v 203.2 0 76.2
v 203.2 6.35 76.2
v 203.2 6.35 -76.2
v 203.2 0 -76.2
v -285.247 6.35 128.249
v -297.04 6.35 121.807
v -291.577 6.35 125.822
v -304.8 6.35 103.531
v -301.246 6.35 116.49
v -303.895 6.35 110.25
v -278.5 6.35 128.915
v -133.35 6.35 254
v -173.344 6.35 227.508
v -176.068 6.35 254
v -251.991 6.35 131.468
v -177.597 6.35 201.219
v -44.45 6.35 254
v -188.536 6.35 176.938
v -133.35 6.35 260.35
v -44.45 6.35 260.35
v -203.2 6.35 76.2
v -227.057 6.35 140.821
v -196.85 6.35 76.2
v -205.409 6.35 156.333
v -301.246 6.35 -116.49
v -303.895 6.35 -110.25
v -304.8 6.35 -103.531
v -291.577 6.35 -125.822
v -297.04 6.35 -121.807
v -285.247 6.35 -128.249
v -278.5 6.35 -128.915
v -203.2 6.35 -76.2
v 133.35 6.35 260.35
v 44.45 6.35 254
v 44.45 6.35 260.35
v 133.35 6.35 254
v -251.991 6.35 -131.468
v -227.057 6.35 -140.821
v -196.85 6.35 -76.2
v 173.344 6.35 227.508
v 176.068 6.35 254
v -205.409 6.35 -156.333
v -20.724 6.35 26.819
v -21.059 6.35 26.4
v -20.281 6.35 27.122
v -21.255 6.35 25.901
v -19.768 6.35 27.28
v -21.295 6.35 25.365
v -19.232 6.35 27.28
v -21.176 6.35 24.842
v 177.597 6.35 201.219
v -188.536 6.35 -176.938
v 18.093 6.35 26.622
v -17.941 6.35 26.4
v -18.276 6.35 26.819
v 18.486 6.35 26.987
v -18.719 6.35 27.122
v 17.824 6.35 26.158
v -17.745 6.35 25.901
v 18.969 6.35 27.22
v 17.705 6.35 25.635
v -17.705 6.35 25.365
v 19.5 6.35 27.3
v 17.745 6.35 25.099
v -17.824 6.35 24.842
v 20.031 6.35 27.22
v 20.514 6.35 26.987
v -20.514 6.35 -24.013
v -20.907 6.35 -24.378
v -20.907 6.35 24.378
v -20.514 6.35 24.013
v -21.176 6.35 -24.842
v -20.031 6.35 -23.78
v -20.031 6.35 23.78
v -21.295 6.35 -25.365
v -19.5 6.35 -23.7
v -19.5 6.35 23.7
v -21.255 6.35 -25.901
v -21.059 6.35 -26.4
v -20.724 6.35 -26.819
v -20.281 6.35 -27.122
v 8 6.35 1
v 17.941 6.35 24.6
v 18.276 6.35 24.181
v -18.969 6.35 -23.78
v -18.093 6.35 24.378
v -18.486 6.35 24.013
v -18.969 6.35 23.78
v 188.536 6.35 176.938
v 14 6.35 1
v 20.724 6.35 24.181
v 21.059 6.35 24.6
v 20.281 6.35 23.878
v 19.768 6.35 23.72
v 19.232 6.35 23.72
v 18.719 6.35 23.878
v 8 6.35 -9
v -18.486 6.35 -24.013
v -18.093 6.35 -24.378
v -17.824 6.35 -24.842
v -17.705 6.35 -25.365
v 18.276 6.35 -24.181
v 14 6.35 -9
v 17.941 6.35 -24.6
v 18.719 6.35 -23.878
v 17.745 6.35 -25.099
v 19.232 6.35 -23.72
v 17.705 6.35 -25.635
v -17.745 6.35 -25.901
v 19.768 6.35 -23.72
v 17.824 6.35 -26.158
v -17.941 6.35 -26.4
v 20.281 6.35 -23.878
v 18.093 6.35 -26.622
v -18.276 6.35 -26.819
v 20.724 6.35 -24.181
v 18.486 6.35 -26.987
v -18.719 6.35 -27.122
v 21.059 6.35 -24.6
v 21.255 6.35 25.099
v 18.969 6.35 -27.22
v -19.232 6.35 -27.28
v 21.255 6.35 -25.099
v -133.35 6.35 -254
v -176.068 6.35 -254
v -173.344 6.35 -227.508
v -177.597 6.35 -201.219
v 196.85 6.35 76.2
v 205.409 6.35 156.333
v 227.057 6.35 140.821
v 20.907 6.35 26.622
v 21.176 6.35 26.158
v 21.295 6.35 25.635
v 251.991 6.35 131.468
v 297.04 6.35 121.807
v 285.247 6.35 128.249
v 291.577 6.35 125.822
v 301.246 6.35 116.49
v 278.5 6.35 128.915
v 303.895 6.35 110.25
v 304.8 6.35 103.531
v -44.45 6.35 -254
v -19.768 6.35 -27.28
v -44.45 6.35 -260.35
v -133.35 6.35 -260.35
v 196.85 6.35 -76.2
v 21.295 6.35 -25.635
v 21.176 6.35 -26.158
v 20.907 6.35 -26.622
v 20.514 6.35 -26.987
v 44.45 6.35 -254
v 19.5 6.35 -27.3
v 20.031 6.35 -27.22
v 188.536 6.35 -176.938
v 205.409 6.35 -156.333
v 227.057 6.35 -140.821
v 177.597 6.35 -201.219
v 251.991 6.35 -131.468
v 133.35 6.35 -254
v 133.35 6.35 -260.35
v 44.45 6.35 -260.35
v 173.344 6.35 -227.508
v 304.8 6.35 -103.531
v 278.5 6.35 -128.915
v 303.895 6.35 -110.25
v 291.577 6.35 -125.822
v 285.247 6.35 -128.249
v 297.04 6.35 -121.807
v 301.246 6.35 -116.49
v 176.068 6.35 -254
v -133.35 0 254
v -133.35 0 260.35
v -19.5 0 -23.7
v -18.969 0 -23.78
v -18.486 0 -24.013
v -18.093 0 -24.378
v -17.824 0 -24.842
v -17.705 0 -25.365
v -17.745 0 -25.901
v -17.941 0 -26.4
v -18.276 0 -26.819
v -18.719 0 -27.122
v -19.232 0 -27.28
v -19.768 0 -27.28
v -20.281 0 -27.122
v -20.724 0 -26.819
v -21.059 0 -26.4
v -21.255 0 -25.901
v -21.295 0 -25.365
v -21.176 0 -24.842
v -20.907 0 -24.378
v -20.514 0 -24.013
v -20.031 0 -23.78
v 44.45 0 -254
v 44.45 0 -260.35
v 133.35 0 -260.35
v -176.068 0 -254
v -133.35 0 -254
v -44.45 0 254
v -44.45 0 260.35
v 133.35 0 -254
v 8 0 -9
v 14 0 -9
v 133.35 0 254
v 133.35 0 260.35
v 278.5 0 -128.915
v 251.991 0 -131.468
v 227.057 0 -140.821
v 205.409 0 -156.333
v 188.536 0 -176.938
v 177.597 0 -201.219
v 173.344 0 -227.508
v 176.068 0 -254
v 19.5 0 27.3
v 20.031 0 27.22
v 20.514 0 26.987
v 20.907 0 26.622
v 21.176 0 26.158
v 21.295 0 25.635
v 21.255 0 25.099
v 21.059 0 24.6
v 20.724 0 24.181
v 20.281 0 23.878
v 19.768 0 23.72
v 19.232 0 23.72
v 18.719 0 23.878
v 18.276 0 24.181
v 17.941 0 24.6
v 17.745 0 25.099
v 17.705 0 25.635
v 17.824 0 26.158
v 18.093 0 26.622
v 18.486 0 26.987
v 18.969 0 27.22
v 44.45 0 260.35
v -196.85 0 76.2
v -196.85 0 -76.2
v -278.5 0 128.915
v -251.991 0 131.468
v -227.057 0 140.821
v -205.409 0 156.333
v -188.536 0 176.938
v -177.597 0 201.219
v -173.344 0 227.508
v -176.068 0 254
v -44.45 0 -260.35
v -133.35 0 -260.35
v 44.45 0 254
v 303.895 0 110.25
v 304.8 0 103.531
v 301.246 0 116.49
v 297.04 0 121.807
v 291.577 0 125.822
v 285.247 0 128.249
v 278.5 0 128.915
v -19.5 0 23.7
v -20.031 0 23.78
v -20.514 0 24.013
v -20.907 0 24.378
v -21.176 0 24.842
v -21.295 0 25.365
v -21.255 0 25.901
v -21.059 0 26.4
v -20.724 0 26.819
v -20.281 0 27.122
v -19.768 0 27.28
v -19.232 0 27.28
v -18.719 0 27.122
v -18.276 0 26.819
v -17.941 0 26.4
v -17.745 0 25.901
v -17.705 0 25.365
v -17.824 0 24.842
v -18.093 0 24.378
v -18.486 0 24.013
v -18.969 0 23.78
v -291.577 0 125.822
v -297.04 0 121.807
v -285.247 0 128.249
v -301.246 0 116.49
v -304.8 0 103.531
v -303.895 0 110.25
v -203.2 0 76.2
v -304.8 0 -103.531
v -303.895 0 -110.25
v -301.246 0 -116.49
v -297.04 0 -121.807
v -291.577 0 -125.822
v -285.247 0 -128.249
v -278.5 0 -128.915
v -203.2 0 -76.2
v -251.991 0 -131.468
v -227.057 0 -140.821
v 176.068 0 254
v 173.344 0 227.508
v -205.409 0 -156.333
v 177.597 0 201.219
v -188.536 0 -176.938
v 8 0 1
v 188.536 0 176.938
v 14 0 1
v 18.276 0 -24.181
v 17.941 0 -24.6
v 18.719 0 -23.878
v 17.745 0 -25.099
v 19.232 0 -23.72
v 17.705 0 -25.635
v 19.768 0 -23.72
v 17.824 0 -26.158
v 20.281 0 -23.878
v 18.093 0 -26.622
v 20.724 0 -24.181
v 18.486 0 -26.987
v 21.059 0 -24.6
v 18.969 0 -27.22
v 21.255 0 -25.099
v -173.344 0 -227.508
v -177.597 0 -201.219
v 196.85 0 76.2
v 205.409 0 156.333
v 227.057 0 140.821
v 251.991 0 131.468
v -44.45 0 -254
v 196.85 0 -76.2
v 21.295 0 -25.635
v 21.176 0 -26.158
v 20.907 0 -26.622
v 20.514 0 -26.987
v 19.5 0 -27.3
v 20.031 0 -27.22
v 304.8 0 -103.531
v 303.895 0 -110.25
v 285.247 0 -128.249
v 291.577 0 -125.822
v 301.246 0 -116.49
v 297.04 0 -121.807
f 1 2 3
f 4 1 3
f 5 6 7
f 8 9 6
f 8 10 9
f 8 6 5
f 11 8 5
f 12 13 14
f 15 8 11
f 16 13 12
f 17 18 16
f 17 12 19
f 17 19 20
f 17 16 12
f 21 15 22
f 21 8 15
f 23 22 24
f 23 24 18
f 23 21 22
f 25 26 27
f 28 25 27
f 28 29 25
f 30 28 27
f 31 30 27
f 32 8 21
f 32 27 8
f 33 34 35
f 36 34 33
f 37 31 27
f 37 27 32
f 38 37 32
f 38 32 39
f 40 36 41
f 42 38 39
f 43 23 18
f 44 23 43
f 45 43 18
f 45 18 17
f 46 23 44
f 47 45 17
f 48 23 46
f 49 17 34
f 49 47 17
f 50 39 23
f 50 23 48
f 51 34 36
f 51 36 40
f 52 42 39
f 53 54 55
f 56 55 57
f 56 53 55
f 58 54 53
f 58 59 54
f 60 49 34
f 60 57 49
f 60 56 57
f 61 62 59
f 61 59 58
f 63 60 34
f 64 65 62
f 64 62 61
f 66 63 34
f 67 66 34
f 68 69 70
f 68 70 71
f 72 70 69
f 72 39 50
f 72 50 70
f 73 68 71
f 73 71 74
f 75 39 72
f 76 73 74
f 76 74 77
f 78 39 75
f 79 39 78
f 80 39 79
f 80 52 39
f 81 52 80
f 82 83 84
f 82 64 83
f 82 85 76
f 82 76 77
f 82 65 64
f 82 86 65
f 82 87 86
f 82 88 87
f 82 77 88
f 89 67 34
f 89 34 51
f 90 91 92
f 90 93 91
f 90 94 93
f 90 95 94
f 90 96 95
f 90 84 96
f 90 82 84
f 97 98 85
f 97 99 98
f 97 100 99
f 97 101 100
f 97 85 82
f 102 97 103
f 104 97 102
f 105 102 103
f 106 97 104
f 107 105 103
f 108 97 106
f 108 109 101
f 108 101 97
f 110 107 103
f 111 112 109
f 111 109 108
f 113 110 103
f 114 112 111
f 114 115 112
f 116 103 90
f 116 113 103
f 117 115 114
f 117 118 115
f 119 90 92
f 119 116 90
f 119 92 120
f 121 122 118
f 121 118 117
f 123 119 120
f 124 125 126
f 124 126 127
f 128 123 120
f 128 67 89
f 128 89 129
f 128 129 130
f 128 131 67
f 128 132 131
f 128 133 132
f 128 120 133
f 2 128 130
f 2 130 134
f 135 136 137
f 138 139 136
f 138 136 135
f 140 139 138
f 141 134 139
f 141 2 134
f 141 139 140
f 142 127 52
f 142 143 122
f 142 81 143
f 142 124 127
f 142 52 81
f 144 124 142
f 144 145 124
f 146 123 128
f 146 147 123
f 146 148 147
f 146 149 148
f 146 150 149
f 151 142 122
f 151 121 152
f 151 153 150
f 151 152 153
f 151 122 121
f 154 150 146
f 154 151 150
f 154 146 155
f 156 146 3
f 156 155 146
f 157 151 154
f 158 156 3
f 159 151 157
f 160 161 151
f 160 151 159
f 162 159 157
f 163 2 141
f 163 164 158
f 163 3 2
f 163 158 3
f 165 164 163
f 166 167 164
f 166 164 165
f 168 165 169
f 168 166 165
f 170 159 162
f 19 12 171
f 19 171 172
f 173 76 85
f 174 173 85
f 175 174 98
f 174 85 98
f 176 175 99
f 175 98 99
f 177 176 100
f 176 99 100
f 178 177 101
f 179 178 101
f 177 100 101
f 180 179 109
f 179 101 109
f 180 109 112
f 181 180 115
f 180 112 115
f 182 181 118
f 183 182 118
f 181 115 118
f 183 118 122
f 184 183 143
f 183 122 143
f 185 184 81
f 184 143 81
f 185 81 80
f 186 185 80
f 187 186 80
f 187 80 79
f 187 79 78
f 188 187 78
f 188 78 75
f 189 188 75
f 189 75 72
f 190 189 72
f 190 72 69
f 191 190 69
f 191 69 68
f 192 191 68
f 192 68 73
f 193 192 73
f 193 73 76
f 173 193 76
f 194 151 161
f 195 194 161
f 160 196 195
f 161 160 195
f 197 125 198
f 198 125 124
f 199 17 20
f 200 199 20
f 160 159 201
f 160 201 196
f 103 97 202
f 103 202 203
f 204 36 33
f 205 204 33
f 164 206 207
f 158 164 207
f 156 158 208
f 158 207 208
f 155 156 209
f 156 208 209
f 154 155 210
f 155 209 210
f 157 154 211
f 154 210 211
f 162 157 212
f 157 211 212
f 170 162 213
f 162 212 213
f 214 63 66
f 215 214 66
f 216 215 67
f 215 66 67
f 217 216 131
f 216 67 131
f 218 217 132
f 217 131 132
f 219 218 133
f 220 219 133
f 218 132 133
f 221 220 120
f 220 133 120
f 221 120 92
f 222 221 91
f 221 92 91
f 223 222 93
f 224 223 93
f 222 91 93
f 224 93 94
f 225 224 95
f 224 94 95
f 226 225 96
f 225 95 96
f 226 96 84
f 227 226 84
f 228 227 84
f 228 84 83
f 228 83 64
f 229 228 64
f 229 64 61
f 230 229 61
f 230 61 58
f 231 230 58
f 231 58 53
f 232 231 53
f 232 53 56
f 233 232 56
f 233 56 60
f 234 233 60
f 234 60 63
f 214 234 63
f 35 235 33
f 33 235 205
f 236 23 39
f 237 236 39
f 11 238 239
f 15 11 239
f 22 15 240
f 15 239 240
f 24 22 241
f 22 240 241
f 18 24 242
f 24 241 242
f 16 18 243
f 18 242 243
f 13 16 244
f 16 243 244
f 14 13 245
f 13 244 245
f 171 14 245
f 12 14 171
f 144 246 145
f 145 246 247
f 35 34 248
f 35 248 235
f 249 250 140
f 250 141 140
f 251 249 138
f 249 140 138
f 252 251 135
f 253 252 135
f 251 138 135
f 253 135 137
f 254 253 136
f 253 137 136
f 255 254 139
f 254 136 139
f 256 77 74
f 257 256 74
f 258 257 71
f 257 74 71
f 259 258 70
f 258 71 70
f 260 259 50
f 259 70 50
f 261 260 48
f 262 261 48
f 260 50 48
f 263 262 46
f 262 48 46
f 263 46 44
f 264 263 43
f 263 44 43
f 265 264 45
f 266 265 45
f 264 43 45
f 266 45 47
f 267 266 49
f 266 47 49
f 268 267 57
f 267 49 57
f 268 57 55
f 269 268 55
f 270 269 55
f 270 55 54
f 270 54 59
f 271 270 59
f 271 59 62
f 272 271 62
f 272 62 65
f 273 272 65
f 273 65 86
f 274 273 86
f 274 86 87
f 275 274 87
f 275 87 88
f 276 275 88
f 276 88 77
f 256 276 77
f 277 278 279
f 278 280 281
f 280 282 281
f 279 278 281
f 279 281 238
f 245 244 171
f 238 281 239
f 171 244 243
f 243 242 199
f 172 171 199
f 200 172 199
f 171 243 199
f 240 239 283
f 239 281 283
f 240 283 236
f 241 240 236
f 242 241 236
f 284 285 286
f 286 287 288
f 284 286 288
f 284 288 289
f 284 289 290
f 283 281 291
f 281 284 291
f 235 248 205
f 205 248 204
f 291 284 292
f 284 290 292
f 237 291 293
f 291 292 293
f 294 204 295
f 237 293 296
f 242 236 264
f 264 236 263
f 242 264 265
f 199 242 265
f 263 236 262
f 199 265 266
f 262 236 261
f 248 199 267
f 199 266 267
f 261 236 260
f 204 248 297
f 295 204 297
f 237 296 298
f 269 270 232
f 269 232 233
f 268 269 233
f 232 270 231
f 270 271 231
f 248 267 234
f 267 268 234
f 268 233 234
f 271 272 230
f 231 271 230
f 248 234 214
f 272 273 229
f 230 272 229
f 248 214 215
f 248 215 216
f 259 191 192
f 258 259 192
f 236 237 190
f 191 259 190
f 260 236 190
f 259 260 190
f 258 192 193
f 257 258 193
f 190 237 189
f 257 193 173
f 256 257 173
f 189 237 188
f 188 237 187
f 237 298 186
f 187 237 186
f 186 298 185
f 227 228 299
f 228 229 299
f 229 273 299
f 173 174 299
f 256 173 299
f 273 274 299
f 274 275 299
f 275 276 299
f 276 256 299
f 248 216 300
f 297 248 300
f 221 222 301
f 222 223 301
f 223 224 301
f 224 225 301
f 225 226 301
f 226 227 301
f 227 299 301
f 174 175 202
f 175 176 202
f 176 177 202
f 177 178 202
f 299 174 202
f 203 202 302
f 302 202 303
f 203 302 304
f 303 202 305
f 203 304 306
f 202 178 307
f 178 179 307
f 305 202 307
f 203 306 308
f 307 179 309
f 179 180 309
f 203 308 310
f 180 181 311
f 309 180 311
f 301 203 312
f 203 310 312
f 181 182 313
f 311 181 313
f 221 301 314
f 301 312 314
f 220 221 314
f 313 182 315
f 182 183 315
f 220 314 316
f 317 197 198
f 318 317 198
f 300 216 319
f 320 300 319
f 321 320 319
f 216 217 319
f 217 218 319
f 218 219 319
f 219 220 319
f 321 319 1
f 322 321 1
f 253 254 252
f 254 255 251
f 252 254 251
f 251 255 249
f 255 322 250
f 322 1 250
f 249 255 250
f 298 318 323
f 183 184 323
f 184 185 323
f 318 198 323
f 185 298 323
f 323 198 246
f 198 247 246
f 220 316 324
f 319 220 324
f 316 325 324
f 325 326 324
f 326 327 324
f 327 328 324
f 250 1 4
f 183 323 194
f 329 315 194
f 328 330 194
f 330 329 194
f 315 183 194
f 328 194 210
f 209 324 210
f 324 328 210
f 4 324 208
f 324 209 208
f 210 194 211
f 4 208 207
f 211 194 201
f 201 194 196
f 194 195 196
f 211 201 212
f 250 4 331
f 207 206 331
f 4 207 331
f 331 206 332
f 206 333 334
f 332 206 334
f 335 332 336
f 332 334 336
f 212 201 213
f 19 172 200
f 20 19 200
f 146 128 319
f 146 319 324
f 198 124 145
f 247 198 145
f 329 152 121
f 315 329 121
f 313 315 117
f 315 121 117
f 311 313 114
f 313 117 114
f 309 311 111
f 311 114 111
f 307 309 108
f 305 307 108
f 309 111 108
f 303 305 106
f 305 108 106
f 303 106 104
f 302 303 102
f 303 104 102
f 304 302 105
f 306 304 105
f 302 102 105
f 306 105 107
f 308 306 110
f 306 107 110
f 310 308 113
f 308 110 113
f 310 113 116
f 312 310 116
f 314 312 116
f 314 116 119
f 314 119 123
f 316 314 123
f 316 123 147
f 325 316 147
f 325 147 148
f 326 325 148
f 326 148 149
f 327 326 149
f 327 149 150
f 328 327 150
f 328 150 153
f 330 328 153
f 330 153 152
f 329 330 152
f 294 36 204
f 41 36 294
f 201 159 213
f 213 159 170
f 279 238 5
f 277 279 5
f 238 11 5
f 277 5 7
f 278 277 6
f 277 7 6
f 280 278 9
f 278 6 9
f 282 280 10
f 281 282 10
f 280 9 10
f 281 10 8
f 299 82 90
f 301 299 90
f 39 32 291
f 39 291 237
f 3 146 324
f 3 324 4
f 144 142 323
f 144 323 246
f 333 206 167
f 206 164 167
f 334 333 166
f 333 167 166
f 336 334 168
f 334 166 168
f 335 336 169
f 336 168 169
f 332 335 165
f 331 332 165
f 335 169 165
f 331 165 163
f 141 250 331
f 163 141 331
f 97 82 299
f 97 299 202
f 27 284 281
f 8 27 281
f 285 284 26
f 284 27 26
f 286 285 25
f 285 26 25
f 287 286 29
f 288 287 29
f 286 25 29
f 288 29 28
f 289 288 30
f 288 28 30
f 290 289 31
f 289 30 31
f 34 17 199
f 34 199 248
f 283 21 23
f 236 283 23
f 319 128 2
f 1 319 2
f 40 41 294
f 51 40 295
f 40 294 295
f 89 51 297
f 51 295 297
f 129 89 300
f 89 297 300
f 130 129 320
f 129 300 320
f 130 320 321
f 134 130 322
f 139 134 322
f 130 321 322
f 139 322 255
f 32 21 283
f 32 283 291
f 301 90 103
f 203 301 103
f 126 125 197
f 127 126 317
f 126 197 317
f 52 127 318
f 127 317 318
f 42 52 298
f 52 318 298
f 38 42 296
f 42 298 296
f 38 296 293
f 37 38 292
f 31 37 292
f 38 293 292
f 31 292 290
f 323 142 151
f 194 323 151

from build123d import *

# Parameters (mm, degrees)
BOSS_EXTRUDE1_DEPTH = 6.35
SKETCH4_W           = 88.9
SKETCH4_H           = 6.35
CUT_EXTRUDE2_DEPTH  = 401.905830589
FILLET2_R           = 25.4
SKETCH6_W           = 6.35
SKETCH6_H           = 152.4
CUT_EXTRUDE3_DEPTH  = 401.905830589
SKETCH7_W           = 6
SKETCH7_H           = 10
SKETCH7_R           = 1.8
CUT_EXTRUDE4_DEPTH  = 401.905830589


with BuildPart() as part:
    # Sketch1 → Boss-Extrude1 (new body)
    with BuildSketch(Plane(origin=(0, 0, 0), x_dir=(1, 0, 0), z_dir=(0, 1, 0))):
        with BuildLine():
            ThreePointArc((-304.8, -133.35), (-203.058992682, -158.608992682), (-177.8, -260.35))
            Line((-177.8, -260.35), (177.8, -260.35))
            ThreePointArc((177.8, -260.35), (203.058992682, -158.608992682), (304.8, -133.35))
            Line((304.8, -133.35), (304.8, 133.35))
            ThreePointArc((304.8, 133.35), (203.058992682, 158.608992682), (177.8, 260.35))
            Line((177.8, 260.35), (-177.8, 260.35))
            ThreePointArc((-177.8, 260.35), (-203.058992682, 158.608992682), (-304.8, 133.35))
            Line((-304.8, 133.35), (-304.8, -133.35))
        make_face()
    extrude(amount=BOSS_EXTRUDE1_DEPTH)

    # Sketch4 → Cut-Extrude2 (cut, through all)
    with BuildSketch(Plane(origin=(0, 6.35, 0), x_dir=(1, 0, 0), z_dir=(0, 1, 0))):
        with Locations((-177.8, 257.175)):
            Rectangle(SKETCH4_W, SKETCH4_H)
        with Locations((0, 257.175)):
            Rectangle(SKETCH4_W, SKETCH4_H)
        with Locations((177.8, 257.175)):
            Rectangle(SKETCH4_W, SKETCH4_H)
    cut_extrude2 = extrude(amount=-CUT_EXTRUDE2_DEPTH, mode=Mode.SUBTRACT)

    # Mirror2: Cut-Extrude2 across plane
    add(cut_extrude2.mirror(Plane.XY), mode=Mode.SUBTRACT)

    # Fillet2
    fillet2_edges = [part.edges().sort_by_distance(p)[0] for p in [
        (-304.8, 3.175, 133.35),
        (-304.8, 3.175, -133.35),
        (304.8, 3.175, -133.35),
        (304.8, 3.175, 133.35),
    ]]
    fillet(fillet2_edges, radius=FILLET2_R)

    # Sketch6 → Cut-Extrude3 (cut, through all)
    with BuildSketch(Plane(origin=(0, 6.35, 0), x_dir=(1, 0, 0), z_dir=(0, 1, 0))):
        with Locations((-200.025, 0)):
            Rectangle(SKETCH6_W, SKETCH6_H)
        with Locations((200.025, 0)):
            Rectangle(SKETCH6_W, SKETCH6_H)
    extrude(amount=-CUT_EXTRUDE3_DEPTH, mode=Mode.SUBTRACT)

    # Sketch7 → Cut-Extrude4 (cut, through all)
    with BuildSketch(Plane(origin=(0, 6.35, 0), x_dir=(1, 0, 0), z_dir=(0, 1, 0))):
        with Locations((11, 4)):
            Rectangle(SKETCH7_W, SKETCH7_H)
        with Locations(Location((-19.5, 25.5, 0), (0, 0, 270))):
            Circle(SKETCH7_R)
        with Locations(Location((-19.5, -25.5, 0), (0, 0, 90))):
            Circle(SKETCH7_R)
        with Locations(Location((19.5, -25.5, 0), (0, 0, 270))):
            Circle(SKETCH7_R)
        with Locations(Location((19.5, 25.5, 0), (0, 0, 90))):
            Circle(SKETCH7_R)
    extrude(amount=-CUT_EXTRUDE4_DEPTH, mode=Mode.SUBTRACT)


solid = part.part
